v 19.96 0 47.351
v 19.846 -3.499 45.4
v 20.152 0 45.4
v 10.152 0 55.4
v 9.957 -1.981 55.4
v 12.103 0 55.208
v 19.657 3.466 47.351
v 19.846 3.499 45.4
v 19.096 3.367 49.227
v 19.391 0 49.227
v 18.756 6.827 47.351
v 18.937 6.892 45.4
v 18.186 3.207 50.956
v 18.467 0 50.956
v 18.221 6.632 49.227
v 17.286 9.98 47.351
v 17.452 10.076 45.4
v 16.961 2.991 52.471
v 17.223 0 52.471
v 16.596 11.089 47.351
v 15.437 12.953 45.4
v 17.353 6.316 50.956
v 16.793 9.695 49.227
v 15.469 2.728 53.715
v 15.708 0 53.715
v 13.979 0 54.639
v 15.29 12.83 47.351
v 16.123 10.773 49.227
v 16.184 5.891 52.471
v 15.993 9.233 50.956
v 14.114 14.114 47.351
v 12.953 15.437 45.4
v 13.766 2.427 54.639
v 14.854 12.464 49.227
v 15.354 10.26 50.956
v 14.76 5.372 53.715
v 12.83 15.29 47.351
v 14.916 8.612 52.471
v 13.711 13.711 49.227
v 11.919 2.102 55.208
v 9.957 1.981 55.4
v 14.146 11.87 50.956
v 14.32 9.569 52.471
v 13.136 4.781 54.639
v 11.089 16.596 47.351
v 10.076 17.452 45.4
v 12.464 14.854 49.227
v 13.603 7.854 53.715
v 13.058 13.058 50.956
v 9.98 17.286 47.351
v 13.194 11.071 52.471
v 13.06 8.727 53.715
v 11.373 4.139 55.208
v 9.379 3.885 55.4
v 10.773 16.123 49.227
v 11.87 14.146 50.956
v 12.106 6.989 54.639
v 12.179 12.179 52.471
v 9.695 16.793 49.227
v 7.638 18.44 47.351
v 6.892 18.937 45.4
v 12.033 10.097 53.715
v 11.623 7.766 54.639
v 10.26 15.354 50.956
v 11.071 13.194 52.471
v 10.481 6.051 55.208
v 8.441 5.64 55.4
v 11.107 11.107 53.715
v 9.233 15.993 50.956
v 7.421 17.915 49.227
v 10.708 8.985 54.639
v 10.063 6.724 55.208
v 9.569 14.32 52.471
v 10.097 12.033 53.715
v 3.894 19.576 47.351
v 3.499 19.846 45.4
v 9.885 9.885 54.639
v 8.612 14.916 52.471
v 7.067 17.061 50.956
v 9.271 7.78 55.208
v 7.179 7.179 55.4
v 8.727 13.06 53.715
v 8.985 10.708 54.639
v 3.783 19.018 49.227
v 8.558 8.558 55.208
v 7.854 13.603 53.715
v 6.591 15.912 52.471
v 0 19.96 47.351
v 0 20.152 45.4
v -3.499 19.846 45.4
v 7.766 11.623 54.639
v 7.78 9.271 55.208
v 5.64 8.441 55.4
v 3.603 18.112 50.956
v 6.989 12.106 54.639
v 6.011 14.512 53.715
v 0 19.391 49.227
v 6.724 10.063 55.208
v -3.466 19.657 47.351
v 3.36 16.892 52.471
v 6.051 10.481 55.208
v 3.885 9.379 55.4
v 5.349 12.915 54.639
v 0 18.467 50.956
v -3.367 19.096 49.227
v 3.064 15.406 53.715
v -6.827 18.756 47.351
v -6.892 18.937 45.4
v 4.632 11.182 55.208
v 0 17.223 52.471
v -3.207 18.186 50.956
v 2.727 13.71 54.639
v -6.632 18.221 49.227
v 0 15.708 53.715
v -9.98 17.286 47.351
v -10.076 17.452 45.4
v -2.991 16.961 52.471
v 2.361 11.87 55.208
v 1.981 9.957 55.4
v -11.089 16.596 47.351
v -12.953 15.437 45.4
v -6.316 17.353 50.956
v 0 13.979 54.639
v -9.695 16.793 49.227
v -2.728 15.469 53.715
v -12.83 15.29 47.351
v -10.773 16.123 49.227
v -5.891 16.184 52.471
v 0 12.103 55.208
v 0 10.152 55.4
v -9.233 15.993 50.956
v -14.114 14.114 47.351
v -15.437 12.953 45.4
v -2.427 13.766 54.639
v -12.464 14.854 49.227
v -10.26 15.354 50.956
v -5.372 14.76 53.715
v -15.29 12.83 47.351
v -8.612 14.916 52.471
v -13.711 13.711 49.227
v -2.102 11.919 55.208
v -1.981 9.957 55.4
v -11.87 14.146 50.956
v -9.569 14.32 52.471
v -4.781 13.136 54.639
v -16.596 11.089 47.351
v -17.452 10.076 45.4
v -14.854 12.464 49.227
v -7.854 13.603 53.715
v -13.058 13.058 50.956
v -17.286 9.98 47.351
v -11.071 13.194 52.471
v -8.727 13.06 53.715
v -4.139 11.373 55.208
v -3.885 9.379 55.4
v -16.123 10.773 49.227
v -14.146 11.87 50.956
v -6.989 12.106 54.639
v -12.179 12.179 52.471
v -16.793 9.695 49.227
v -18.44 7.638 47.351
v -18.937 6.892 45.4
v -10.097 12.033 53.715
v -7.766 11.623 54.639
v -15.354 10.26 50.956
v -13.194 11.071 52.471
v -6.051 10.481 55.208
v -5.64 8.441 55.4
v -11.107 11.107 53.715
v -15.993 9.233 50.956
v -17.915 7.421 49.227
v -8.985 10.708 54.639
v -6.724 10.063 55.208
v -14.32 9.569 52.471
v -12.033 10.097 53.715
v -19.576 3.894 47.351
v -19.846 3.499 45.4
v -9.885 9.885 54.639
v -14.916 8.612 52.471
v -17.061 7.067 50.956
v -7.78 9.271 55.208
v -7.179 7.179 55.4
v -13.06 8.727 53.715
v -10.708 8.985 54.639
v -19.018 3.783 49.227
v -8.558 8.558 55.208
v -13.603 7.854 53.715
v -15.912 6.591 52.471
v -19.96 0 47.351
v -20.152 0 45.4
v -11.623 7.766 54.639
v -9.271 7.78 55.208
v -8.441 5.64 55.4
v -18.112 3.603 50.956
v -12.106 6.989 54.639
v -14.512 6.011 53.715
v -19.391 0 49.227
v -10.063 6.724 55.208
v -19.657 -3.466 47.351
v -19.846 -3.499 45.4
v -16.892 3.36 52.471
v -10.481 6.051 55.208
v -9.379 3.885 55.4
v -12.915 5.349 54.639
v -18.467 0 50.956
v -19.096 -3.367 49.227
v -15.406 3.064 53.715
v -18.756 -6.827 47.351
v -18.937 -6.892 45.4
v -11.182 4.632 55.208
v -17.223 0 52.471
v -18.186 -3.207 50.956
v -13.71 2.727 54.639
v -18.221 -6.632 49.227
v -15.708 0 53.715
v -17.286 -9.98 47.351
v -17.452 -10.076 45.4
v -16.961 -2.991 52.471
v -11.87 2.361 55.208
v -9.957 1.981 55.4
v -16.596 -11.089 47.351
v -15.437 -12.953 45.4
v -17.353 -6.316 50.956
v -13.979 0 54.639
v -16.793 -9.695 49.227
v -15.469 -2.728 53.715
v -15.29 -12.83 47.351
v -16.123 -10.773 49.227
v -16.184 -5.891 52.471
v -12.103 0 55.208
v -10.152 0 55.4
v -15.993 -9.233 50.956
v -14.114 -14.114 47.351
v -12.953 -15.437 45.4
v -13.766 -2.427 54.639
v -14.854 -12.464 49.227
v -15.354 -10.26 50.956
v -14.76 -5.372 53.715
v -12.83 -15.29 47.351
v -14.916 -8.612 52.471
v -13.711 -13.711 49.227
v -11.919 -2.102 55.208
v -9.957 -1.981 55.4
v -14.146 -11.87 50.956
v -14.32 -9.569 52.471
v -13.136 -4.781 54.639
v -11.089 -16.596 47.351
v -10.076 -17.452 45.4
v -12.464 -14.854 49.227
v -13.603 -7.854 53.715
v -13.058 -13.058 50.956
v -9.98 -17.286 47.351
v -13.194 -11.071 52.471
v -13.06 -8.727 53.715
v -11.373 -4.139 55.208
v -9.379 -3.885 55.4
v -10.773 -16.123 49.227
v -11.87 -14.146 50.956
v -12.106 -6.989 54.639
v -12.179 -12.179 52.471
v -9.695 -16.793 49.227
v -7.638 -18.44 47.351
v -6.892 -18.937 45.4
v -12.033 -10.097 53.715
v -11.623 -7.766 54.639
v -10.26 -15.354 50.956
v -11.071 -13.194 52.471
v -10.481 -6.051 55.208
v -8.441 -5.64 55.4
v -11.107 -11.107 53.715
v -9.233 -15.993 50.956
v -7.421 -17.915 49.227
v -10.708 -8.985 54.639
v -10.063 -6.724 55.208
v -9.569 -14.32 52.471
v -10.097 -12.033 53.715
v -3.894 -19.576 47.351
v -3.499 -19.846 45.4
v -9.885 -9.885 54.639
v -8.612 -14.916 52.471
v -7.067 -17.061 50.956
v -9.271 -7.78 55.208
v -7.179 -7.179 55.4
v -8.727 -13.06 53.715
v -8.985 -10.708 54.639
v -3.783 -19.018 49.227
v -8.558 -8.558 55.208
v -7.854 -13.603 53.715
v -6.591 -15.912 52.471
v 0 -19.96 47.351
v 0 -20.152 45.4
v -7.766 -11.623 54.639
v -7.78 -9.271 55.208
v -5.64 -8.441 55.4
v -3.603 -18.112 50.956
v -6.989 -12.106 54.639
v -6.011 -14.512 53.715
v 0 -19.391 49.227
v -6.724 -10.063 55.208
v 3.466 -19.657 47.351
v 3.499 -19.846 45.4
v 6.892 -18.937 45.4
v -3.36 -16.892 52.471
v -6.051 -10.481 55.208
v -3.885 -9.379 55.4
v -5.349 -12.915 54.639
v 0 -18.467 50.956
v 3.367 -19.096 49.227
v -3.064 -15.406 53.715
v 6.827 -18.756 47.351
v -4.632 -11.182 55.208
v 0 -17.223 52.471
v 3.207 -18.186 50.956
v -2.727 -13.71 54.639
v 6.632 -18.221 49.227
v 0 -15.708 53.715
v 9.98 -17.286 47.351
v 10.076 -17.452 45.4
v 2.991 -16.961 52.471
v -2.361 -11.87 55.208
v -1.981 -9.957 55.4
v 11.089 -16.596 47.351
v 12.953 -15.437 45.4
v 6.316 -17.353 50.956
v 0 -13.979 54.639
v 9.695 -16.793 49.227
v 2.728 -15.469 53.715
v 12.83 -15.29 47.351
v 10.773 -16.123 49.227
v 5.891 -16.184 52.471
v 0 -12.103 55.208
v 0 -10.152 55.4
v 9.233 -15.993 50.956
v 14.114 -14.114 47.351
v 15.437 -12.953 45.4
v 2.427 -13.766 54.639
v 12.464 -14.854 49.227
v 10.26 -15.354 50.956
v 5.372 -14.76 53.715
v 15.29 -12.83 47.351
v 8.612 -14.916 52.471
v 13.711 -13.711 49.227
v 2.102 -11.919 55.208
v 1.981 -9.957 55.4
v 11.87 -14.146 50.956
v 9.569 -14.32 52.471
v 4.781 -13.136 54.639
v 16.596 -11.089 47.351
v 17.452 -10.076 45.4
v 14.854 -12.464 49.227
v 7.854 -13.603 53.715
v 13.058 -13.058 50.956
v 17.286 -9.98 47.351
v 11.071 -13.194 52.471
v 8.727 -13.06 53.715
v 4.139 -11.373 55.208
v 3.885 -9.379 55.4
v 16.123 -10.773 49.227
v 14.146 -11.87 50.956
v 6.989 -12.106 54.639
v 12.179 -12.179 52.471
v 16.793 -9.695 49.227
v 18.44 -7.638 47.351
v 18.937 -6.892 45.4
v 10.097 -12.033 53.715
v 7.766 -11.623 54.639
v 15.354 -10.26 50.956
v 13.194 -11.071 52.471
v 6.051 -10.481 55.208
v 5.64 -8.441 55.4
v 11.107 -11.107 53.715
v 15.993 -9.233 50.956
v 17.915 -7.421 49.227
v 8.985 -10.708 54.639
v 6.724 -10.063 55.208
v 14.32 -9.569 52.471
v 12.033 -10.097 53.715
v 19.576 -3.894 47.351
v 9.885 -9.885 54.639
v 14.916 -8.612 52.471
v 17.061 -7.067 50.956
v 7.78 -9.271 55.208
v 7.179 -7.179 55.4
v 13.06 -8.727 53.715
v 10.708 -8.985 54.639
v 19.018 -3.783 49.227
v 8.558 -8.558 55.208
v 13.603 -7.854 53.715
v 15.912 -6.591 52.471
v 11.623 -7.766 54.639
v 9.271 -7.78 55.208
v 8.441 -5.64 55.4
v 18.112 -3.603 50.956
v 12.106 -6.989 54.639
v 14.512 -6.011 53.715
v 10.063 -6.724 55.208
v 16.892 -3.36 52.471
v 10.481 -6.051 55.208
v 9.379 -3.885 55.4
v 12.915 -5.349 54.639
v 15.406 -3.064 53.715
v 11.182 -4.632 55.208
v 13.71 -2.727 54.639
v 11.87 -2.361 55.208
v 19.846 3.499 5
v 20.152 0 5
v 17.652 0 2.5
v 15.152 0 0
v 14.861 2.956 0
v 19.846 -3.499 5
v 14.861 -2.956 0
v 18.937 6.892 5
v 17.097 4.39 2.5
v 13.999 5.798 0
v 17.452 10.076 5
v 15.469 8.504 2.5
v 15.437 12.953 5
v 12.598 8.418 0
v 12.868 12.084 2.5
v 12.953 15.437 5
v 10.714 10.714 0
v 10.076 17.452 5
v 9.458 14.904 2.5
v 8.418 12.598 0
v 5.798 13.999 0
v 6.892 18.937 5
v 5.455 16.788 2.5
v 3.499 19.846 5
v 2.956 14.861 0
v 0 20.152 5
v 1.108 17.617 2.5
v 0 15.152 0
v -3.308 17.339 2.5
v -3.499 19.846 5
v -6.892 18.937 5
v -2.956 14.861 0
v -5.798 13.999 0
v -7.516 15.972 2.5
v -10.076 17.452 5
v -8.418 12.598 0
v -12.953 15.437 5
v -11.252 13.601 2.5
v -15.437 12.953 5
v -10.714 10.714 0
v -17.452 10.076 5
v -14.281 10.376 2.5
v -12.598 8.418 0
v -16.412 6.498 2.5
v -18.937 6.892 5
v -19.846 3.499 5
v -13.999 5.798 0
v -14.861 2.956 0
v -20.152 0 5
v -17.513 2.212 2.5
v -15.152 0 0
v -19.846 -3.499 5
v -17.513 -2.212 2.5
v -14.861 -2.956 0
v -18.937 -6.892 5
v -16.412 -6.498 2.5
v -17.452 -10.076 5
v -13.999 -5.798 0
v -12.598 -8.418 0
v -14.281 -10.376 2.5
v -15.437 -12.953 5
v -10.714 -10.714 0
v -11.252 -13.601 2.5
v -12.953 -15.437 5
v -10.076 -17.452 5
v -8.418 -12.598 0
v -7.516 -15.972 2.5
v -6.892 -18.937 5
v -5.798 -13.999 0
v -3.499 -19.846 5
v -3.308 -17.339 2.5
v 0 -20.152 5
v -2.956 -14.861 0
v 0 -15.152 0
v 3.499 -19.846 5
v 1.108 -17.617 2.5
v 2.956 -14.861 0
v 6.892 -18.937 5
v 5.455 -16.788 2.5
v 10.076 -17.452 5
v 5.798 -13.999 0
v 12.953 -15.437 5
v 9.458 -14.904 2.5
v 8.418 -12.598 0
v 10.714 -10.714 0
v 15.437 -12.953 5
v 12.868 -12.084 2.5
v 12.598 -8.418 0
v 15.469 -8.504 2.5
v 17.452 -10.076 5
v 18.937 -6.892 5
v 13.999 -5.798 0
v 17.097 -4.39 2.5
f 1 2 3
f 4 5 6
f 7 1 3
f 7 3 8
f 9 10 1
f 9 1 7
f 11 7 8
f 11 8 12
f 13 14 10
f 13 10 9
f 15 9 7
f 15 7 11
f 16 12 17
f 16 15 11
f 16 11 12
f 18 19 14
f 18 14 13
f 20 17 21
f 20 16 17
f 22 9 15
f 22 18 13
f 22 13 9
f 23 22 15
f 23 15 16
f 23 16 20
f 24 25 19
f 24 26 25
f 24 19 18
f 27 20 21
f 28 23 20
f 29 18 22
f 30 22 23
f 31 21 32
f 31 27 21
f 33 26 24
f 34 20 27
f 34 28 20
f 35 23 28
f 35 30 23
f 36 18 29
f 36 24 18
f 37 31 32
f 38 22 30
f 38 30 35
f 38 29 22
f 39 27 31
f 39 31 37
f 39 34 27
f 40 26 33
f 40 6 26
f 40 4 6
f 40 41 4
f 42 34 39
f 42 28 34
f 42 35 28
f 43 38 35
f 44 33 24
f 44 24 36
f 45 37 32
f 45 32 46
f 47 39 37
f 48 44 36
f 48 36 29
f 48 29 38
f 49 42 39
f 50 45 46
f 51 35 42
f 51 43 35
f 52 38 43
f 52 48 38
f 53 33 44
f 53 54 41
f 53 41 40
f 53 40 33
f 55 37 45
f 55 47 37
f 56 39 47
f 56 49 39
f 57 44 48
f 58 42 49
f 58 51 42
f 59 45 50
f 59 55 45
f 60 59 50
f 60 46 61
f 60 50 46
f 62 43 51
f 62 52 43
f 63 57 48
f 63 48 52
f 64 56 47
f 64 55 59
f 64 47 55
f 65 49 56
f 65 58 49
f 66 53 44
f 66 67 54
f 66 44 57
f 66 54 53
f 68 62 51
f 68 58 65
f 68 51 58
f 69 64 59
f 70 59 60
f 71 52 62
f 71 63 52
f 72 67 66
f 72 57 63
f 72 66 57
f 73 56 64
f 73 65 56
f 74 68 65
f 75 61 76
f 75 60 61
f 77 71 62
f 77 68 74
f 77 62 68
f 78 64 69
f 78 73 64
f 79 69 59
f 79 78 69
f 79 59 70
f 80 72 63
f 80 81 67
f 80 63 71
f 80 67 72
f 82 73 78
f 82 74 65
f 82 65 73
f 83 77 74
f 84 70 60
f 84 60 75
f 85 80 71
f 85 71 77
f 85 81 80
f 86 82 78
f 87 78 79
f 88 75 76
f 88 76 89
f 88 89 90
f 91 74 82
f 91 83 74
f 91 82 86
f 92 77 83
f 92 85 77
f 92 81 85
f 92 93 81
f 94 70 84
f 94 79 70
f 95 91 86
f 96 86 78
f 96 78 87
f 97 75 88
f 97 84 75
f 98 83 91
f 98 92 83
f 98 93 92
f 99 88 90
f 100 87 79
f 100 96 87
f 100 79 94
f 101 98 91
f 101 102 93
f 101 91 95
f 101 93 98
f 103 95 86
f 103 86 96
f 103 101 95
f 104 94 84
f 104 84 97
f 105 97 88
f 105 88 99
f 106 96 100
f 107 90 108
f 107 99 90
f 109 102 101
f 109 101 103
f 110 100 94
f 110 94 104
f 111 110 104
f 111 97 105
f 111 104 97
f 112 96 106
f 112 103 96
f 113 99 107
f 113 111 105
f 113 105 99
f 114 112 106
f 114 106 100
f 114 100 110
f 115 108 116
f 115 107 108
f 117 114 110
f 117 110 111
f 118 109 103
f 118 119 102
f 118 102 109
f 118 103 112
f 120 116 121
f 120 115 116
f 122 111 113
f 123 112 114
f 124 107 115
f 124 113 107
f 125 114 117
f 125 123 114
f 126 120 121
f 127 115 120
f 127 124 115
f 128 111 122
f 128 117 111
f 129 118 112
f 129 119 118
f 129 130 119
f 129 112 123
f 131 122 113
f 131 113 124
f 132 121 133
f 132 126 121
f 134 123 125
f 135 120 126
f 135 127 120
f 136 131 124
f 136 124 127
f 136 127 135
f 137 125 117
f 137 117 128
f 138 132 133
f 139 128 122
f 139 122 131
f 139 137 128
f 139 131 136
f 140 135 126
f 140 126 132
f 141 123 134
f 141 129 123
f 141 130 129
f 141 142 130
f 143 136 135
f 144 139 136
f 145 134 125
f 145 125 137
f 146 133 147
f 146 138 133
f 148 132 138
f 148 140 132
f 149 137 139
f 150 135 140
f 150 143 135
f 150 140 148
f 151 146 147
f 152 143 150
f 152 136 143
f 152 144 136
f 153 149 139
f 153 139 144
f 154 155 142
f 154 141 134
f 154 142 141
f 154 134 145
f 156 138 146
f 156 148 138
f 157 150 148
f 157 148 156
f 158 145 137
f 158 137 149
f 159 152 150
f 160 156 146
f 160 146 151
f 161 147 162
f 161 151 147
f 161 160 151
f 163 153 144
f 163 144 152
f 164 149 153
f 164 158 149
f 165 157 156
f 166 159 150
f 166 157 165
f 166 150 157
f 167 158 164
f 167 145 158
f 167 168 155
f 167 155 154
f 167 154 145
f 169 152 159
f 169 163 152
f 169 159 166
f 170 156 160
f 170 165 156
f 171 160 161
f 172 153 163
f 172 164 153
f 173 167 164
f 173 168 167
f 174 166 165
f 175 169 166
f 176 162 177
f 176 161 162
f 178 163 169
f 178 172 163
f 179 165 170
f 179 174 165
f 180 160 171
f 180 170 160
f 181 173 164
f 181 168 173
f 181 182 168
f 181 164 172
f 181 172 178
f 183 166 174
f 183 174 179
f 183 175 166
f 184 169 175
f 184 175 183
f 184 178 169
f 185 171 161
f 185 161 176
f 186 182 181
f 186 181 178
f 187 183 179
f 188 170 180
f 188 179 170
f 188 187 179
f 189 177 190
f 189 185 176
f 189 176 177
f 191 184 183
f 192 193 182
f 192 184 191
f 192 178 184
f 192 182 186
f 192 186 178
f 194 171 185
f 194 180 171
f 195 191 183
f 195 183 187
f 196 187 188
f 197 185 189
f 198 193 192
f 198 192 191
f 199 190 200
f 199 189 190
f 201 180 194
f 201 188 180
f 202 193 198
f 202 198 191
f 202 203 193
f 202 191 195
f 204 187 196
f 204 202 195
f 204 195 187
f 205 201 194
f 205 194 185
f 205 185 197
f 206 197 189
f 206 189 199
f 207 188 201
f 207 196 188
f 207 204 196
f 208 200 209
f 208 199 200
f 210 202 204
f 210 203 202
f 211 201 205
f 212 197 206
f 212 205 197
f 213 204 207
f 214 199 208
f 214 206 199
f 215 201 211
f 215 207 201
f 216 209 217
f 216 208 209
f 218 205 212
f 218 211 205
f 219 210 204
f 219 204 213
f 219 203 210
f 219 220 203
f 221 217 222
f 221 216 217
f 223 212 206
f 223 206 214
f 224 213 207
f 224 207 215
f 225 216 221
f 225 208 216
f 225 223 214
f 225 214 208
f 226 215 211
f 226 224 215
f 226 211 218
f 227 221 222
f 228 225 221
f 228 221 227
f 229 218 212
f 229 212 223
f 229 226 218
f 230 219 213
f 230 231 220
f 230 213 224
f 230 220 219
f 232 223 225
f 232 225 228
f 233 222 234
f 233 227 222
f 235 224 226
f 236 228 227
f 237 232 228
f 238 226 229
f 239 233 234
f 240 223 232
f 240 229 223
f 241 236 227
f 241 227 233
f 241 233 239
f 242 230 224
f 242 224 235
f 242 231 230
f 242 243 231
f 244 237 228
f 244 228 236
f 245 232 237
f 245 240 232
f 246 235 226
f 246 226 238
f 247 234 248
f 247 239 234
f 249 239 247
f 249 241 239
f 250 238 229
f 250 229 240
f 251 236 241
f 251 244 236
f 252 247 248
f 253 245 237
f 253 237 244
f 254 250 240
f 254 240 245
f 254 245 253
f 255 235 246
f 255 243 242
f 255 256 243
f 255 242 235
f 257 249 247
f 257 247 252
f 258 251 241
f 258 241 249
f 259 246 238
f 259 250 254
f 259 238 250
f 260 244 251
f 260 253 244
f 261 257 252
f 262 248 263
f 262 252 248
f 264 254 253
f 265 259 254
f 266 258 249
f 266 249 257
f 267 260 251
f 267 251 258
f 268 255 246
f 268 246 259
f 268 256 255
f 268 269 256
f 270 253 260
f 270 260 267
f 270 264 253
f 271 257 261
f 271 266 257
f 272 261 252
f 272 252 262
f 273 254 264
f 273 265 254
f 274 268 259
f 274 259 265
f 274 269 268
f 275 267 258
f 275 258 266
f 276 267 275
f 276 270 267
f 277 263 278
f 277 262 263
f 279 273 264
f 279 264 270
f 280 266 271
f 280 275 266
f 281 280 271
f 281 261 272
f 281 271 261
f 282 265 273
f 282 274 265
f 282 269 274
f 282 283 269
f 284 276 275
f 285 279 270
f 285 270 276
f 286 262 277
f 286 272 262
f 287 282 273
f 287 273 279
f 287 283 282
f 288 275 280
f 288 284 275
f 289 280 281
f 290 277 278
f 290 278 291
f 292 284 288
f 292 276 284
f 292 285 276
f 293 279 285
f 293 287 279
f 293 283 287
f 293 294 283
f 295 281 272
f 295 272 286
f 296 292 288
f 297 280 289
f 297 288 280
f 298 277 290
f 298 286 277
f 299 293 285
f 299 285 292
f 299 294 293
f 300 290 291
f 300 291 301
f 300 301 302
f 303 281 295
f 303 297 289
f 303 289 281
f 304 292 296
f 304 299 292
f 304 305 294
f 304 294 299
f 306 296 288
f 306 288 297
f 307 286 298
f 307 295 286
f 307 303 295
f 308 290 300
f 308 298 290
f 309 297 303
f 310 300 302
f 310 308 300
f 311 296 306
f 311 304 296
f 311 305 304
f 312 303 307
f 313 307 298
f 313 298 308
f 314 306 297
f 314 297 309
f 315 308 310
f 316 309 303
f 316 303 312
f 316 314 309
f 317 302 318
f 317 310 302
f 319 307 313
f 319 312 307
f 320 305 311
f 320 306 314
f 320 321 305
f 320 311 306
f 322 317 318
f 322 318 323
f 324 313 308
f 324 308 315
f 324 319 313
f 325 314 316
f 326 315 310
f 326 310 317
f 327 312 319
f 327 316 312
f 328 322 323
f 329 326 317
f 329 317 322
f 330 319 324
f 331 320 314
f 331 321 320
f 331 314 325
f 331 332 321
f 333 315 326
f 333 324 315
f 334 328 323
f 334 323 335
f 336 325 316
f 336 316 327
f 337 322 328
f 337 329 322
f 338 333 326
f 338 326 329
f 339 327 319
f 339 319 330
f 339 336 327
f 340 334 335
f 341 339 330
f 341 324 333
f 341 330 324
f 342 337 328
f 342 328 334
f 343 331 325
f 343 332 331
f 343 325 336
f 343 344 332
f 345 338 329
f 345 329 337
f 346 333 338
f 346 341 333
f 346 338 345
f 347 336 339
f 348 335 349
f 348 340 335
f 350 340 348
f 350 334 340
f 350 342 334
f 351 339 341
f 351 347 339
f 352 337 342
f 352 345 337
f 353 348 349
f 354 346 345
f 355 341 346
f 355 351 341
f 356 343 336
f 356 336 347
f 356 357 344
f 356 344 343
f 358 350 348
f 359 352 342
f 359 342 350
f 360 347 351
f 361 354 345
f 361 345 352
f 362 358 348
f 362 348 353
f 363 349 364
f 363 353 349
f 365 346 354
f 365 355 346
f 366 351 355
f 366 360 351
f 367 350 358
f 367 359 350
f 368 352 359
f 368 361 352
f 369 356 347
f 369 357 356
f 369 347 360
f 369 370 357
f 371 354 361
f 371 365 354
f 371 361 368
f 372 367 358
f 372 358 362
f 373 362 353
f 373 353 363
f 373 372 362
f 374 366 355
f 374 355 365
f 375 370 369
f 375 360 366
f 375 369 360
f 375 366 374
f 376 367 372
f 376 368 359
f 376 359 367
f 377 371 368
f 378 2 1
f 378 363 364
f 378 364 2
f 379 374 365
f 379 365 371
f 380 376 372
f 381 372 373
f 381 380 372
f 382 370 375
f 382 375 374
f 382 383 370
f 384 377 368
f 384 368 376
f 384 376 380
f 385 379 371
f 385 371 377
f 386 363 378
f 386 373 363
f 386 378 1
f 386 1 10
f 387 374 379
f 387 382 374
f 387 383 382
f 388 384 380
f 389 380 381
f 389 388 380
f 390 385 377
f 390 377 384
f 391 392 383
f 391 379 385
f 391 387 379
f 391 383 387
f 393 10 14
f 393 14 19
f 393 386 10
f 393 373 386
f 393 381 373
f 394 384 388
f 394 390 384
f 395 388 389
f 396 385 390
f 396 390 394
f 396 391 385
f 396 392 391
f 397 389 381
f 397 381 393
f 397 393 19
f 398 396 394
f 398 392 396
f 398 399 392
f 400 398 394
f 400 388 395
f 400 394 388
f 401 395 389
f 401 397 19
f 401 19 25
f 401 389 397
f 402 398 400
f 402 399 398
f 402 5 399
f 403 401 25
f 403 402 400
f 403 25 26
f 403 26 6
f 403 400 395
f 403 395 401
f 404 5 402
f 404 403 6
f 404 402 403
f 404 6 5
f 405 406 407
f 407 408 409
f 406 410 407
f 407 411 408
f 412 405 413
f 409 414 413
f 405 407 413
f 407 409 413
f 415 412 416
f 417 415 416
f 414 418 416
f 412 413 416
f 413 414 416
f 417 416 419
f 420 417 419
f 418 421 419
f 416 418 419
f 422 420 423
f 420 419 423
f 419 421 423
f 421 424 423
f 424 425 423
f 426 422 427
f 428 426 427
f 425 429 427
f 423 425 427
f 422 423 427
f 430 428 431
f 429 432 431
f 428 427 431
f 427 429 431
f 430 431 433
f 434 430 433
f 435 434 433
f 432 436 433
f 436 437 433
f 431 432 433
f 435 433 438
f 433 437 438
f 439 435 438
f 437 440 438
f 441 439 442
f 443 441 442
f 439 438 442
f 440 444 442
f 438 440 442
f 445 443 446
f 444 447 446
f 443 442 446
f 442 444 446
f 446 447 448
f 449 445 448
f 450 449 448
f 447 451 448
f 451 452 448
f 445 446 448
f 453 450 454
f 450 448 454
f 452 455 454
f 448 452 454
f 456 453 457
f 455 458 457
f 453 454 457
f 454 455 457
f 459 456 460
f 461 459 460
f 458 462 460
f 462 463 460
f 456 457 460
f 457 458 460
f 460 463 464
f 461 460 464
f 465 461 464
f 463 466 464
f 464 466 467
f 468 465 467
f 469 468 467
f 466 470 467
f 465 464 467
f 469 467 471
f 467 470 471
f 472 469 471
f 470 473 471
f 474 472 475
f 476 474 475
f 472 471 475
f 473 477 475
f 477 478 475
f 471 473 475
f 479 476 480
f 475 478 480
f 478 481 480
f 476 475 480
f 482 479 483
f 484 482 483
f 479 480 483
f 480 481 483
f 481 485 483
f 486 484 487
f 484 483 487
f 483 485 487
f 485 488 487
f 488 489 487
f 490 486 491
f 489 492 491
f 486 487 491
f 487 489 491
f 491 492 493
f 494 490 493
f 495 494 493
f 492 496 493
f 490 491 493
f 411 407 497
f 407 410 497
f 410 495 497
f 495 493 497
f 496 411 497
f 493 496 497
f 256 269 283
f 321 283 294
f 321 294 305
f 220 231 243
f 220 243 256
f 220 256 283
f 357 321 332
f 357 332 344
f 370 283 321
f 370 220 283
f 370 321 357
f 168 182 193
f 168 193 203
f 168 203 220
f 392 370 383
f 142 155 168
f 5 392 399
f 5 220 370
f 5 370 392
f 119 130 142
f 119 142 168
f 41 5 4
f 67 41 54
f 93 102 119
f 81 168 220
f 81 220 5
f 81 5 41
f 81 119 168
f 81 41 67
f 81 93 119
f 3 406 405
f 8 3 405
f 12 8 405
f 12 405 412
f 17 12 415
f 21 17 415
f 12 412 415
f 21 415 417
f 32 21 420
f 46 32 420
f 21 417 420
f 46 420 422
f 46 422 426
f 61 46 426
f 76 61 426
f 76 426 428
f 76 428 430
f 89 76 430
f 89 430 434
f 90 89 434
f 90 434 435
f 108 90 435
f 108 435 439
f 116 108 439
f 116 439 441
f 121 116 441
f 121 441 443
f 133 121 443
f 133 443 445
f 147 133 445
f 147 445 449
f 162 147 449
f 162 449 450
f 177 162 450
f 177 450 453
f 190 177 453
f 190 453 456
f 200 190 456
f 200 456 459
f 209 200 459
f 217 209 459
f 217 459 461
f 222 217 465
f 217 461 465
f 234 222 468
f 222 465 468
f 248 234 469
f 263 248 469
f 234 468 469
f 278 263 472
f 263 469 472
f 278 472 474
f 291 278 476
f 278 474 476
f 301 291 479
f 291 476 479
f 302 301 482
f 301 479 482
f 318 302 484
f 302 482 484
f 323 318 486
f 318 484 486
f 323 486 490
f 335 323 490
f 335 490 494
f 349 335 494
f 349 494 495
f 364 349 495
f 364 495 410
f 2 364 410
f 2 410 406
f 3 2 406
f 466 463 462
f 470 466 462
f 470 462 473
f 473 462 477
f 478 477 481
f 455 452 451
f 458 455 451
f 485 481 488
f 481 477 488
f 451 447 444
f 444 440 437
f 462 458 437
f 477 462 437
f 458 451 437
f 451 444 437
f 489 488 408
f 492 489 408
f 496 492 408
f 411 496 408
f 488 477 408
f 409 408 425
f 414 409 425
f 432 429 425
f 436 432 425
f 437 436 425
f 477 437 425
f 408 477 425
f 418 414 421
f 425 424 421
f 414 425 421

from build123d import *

# Parameters (mm, degrees)
F0_R     = 20.1519646926
F1_DEPTH = 25.4
F2_DEPTH = 30
F3_R     = 10
F4_SIZE  = 5


with BuildPart() as f1:
    # F0 (on Top) → F1 (new body)
    with BuildSketch(Plane.XY):
        Circle(F0_R)
    extrude(amount=F1_DEPTH)

    # F2 (add): a face of the model
    f2_faces = [f1.faces().sort_by_distance(p)[0] for p in [
        (0, 0, 25.4),
    ]]
    extrude(f2_faces, amount=F2_DEPTH)

    # F3
    f3_edges = [f1.edges().sort_by_distance(p)[0] for p in [
        (-20.151965, 0, 55.4),
    ]]
    fillet(f3_edges, radius=F3_R)

    # F4
    f4_edges = [f1.edges().sort_by_distance(p)[0] for p in [
        (-20.151965, 0, 0),
    ]]
    chamfer(f4_edges, length=F4_SIZE)


solid = f1.part
